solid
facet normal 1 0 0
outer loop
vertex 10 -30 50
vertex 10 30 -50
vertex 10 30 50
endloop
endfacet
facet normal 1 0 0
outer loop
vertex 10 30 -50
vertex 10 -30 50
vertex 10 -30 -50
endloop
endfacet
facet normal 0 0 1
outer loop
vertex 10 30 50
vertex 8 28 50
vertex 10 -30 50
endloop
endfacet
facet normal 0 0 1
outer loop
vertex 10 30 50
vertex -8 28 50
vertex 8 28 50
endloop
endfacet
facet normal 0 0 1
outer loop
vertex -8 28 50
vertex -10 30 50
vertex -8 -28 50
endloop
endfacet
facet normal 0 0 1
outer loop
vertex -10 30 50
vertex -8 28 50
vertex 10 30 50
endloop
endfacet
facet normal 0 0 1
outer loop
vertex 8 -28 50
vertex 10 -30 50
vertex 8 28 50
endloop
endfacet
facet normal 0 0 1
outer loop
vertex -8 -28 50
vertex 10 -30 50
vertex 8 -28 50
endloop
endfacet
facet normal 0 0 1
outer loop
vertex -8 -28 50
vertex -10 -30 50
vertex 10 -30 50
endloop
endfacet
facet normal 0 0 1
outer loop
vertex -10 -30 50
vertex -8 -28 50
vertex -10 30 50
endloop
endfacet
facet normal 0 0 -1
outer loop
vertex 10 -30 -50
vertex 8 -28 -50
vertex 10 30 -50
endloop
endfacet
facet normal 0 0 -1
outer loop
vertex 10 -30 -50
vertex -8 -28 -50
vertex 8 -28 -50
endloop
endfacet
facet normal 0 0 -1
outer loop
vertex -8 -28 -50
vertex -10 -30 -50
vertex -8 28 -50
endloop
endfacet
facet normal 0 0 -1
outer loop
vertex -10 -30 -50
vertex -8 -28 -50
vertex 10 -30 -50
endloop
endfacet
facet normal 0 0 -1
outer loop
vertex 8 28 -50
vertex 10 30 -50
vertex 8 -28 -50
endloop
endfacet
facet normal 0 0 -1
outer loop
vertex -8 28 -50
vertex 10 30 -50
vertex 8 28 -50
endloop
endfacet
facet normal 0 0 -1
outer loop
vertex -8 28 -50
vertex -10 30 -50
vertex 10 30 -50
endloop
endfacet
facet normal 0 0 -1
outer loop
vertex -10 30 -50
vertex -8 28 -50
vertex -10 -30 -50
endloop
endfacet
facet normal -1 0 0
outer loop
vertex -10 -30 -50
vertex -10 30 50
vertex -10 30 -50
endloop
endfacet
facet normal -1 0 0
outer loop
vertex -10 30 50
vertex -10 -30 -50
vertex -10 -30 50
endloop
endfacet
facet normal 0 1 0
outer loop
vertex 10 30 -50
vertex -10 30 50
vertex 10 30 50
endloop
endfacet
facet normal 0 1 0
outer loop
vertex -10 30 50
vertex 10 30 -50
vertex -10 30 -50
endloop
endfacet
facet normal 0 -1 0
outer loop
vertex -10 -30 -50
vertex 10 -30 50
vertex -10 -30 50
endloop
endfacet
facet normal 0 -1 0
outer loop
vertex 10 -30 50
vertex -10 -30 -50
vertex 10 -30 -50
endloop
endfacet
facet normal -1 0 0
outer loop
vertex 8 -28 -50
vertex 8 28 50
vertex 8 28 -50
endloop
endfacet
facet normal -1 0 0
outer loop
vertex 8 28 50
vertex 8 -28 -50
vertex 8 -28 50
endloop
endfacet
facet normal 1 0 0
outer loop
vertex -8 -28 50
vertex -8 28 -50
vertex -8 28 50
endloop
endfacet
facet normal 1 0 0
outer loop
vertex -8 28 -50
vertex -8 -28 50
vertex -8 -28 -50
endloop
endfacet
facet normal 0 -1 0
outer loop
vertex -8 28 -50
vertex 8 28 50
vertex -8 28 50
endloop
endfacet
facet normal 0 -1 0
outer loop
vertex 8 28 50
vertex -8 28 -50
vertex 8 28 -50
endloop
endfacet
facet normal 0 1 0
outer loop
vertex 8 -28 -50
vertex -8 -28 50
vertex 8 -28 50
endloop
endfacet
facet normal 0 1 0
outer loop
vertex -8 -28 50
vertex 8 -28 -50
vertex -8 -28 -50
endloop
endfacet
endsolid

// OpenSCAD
module aluminium_extrusion() {
    difference() {
        cube([20, 60, 100], center = true);
        translate([-8, -28, -50])
            cube([16, 56, 100], center = false);
    }
}

aluminium_extrusion();
